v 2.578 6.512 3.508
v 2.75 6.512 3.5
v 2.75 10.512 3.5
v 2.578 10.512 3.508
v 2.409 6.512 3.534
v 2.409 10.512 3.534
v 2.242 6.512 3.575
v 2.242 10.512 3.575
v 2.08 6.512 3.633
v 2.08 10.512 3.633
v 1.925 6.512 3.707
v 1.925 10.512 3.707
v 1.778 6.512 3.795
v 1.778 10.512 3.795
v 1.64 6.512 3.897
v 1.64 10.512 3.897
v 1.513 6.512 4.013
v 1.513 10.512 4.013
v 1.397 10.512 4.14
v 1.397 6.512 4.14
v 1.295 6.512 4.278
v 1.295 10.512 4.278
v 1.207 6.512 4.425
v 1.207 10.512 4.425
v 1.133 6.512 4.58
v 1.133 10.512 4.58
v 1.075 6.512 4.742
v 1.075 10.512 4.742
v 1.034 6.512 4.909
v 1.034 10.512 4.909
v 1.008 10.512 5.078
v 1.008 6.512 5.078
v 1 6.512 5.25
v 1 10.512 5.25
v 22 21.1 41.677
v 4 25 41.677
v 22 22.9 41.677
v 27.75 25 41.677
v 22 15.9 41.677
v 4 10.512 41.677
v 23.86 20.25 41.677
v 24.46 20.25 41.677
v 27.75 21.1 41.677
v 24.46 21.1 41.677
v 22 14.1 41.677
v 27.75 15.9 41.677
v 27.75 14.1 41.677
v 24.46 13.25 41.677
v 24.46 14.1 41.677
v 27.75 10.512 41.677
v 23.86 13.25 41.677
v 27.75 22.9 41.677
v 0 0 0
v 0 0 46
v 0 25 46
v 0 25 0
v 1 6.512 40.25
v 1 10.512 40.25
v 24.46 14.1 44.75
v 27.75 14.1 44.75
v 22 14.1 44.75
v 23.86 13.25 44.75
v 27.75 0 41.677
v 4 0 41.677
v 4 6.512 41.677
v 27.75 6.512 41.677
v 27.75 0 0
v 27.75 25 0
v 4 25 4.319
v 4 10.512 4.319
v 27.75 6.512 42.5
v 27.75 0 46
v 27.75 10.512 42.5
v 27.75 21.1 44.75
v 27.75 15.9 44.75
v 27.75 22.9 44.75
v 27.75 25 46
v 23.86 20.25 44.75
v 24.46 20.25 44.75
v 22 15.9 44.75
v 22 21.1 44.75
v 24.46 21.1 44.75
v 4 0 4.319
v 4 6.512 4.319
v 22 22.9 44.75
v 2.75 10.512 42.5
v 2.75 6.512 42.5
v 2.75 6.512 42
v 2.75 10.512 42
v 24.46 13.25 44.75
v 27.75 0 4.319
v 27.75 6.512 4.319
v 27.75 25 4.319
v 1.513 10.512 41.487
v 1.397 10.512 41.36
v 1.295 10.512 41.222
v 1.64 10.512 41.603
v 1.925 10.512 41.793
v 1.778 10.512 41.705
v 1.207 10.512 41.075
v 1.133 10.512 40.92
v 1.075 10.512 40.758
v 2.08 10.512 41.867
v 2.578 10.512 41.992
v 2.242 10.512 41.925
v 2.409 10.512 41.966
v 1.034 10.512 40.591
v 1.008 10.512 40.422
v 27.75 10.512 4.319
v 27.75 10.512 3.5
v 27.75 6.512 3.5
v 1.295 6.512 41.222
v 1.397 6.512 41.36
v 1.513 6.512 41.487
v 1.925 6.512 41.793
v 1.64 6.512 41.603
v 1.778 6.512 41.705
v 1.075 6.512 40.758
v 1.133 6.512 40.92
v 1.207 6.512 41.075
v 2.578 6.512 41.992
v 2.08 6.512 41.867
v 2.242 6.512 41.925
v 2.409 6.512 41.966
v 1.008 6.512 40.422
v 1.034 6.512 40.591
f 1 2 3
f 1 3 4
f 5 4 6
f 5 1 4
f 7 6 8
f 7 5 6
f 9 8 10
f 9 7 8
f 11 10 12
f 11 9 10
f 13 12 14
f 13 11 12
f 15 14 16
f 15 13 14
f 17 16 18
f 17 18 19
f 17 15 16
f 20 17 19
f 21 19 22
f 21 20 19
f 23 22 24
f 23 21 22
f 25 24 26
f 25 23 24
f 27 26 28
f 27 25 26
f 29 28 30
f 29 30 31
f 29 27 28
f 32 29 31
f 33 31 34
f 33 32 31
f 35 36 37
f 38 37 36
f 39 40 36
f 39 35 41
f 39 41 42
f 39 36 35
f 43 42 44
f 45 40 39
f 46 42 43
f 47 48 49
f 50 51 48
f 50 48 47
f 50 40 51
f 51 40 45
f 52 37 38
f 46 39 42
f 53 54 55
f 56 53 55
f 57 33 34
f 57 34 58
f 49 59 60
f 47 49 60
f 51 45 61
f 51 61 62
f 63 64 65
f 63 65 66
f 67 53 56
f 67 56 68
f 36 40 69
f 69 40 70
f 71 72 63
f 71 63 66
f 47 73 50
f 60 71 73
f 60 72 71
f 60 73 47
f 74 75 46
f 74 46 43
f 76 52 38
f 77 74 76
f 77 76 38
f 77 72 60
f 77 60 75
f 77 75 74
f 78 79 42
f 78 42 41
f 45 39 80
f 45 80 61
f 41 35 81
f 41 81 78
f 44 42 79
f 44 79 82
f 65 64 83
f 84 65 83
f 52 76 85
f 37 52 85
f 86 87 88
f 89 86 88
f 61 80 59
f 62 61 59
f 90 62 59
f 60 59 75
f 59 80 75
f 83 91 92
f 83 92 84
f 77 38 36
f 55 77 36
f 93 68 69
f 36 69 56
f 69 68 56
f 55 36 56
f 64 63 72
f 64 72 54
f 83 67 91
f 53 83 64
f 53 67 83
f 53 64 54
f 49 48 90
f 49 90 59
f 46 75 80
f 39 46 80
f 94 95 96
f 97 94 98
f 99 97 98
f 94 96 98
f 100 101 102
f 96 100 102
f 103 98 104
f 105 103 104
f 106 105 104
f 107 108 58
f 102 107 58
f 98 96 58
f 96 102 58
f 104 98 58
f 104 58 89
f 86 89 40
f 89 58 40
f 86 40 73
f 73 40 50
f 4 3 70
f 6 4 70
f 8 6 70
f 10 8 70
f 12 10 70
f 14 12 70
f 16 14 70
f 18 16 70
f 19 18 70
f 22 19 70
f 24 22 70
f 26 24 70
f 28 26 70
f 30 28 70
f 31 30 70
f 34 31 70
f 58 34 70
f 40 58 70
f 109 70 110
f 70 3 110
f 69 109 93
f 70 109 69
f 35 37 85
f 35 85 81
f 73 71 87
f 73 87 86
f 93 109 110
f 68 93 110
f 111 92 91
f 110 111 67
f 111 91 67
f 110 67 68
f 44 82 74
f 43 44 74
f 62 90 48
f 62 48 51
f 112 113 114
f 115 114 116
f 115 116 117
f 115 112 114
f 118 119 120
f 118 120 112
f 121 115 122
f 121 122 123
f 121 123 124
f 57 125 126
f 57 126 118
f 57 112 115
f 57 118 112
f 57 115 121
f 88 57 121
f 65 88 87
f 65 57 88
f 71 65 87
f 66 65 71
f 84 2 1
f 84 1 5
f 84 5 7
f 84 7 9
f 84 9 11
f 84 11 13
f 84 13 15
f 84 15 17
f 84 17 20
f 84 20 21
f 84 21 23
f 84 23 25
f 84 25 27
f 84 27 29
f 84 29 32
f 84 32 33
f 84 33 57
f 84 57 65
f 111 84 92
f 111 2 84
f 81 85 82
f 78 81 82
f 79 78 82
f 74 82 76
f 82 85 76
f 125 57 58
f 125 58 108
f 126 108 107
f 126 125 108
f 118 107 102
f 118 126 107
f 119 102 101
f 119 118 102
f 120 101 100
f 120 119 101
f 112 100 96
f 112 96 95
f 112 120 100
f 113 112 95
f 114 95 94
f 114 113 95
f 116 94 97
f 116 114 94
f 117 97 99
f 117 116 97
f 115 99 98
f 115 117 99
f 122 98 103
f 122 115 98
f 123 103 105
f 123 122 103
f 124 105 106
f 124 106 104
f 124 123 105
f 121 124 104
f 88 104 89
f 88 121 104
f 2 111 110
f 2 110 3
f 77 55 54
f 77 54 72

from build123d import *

# Parameters (mm, degrees)
SKETCH1_W           = 4
SKETCH1_H           = 25
BOSS_EXTRUDE1_DEPTH = 46
BOSS_EXTRUDE2_START = -25
BOSS_EXTRUDE2_DEPTH = 25
CAVITY2_START       = 6.511576254
CAVITY2_DEPTH       = 4
CUT_EXTRUDE6_START  = -25
SKETCH8_W           = 23.75
SKETCH8_H           = 0.48
CUT_EXTRUDE6_DEPTH  = 25
SKETCH10_W          = 0.5
SKETCH10_H          = 4
CUT_EXTRUDE8_DEPTH  = 25
CUT_EXTRUDE9_DEPTH  = 4.322904331
BOSS_EXTRUDE4_DEPTH = 1.25
SKETCH13_W          = 0.15
SKETCH13_H          = 0.85
CUT_EXTRUDE10_DEPTH = 3.072904331
LPATTERN4_COUNT     = 2
LPATTERN4_PITCH     = 7


# Read off the part's stored shape, not the designer's step: Cavity2
with BuildPart() as part:
    # Sketch1 → Boss-Extrude1 (new body)
    with BuildSketch(Plane.XY):
        with Locations((2, 12.5)):
            Rectangle(SKETCH1_W, SKETCH1_H)
    extrude(amount=BOSS_EXTRUDE1_DEPTH)

    # Sketch2 → Boss-Extrude2 (add)
    with BuildSketch(Plane(origin=(0, 25, 0), x_dir=(1, 0, 0), z_dir=(0, 1, 0)).offset(BOSS_EXTRUDE2_START)):
        Polygon((27.75, -3.5), (27.75, -4.318971826), (4, -4.318971826), (4, -3.5), (4, 0), (27.75, 0), align=None)
        Polygon((4, -46), (27.75, -46), (27.75, -42), (27.75, -41.197095669), (4, -41.197095669), (4, -42), align=None)
    extrude(amount=BOSS_EXTRUDE2_DEPTH)

    # Cavity2 outline → Cavity2 (cut)
    with BuildSketch(Plane(origin=(0, 0, 0), x_dir=(1, 0, 0), z_dir=(0, 1, 0)).offset(CAVITY2_START)):
        with BuildLine():
            Line((1, -5.25), (1, -40.25))
            ThreePointArc((1, -40.25), (1.512563133, -41.487436867), (2.75, -42))
            Line((2.75, -42), (27.75, -42))
            Line((27.75, -42), (27.75, -41.197095669))
            Line((27.75, -41.197095669), (4, -41.197095669))
            Line((4, -41.197095669), (4, -4.318971826))
            Line((4, -4.318971826), (27.75, -4.318971826))
            Line((27.75, -4.318971826), (27.75, -3.5))
            Line((27.75, -3.5), (2.75, -3.5))
            ThreePointArc((2.75, -3.5), (1.512563133, -4.012563133), (1, -5.25))
        make_face()
    extrude(amount=CAVITY2_DEPTH, mode=Mode.SUBTRACT)

    # Sketch8 → Cut-Extrude6 (cut)
    with BuildSketch(Plane(origin=(0, 25, 0), x_dir=(1, 0, 0), z_dir=(0, 1, 0)).offset(CUT_EXTRUDE6_START)):
        with Locations((15.875, -41.437095669)):
            Rectangle(SKETCH8_W, SKETCH8_H)
    extrude(amount=CUT_EXTRUDE6_DEPTH, mode=Mode.SUBTRACT)

    # Sketch10 → Cut-Extrude8 (cut)
    with BuildSketch(Plane(origin=(27.75, 0, 0), x_dir=(0, 0, -1), z_dir=(1, 0, 0))):
        with Locations((-42.25, 8.511576254)):
            Rectangle(SKETCH10_W, SKETCH10_H)
    extrude(amount=-CUT_EXTRUDE8_DEPTH, mode=Mode.SUBTRACT)

    # Sketch11 → Cut-Extrude9 (cut)
    with BuildSketch(Plane.XY.offset(46)):
        Polygon((22, 22.9), (22, 21.1), (23.86, 20.25), (24.31, 20.25), (24.31, 21.1), (27.75, 21.1), (27.75, 22.9), (24.352614362, 22.9), align=None)
    cut_extrude9 = extrude(amount=-CUT_EXTRUDE9_DEPTH, mode=Mode.SUBTRACT)

    # Sketch12 → Boss-Extrude4 (add)
    with BuildSketch(Plane.XY.offset(46)):
        Polygon((27.75, 21.1), (27.75, 22.9), (22, 22.9), (22, 21.1), (23.86, 20.25), (24.31, 20.25), (24.31, 21.1), align=None)
    boss_extrude4 = extrude(amount=-BOSS_EXTRUDE4_DEPTH)

    # Sketch13 → Cut-Extrude10 (cut)
    with BuildSketch(Plane(origin=(0, 0, 41.677095669), x_dir=(-1, 0, 0), z_dir=(0, 0, -1))):
        with Locations((-24.385, 20.675)):
            Rectangle(SKETCH13_W, SKETCH13_H)
    cut_extrude10 = extrude(amount=-CUT_EXTRUDE10_DEPTH, mode=Mode.SUBTRACT)

    # LPattern4: Cut-Extrude9, Boss-Extrude4, Cut-Extrude10 ×2
    with Locations(*[(0, -i * LPATTERN4_PITCH, 0) for i in range(1, LPATTERN4_COUNT)]):
        add(cut_extrude9, mode=Mode.SUBTRACT)
        add(boss_extrude4)
        add(cut_extrude10, mode=Mode.SUBTRACT)


solid = part.part
